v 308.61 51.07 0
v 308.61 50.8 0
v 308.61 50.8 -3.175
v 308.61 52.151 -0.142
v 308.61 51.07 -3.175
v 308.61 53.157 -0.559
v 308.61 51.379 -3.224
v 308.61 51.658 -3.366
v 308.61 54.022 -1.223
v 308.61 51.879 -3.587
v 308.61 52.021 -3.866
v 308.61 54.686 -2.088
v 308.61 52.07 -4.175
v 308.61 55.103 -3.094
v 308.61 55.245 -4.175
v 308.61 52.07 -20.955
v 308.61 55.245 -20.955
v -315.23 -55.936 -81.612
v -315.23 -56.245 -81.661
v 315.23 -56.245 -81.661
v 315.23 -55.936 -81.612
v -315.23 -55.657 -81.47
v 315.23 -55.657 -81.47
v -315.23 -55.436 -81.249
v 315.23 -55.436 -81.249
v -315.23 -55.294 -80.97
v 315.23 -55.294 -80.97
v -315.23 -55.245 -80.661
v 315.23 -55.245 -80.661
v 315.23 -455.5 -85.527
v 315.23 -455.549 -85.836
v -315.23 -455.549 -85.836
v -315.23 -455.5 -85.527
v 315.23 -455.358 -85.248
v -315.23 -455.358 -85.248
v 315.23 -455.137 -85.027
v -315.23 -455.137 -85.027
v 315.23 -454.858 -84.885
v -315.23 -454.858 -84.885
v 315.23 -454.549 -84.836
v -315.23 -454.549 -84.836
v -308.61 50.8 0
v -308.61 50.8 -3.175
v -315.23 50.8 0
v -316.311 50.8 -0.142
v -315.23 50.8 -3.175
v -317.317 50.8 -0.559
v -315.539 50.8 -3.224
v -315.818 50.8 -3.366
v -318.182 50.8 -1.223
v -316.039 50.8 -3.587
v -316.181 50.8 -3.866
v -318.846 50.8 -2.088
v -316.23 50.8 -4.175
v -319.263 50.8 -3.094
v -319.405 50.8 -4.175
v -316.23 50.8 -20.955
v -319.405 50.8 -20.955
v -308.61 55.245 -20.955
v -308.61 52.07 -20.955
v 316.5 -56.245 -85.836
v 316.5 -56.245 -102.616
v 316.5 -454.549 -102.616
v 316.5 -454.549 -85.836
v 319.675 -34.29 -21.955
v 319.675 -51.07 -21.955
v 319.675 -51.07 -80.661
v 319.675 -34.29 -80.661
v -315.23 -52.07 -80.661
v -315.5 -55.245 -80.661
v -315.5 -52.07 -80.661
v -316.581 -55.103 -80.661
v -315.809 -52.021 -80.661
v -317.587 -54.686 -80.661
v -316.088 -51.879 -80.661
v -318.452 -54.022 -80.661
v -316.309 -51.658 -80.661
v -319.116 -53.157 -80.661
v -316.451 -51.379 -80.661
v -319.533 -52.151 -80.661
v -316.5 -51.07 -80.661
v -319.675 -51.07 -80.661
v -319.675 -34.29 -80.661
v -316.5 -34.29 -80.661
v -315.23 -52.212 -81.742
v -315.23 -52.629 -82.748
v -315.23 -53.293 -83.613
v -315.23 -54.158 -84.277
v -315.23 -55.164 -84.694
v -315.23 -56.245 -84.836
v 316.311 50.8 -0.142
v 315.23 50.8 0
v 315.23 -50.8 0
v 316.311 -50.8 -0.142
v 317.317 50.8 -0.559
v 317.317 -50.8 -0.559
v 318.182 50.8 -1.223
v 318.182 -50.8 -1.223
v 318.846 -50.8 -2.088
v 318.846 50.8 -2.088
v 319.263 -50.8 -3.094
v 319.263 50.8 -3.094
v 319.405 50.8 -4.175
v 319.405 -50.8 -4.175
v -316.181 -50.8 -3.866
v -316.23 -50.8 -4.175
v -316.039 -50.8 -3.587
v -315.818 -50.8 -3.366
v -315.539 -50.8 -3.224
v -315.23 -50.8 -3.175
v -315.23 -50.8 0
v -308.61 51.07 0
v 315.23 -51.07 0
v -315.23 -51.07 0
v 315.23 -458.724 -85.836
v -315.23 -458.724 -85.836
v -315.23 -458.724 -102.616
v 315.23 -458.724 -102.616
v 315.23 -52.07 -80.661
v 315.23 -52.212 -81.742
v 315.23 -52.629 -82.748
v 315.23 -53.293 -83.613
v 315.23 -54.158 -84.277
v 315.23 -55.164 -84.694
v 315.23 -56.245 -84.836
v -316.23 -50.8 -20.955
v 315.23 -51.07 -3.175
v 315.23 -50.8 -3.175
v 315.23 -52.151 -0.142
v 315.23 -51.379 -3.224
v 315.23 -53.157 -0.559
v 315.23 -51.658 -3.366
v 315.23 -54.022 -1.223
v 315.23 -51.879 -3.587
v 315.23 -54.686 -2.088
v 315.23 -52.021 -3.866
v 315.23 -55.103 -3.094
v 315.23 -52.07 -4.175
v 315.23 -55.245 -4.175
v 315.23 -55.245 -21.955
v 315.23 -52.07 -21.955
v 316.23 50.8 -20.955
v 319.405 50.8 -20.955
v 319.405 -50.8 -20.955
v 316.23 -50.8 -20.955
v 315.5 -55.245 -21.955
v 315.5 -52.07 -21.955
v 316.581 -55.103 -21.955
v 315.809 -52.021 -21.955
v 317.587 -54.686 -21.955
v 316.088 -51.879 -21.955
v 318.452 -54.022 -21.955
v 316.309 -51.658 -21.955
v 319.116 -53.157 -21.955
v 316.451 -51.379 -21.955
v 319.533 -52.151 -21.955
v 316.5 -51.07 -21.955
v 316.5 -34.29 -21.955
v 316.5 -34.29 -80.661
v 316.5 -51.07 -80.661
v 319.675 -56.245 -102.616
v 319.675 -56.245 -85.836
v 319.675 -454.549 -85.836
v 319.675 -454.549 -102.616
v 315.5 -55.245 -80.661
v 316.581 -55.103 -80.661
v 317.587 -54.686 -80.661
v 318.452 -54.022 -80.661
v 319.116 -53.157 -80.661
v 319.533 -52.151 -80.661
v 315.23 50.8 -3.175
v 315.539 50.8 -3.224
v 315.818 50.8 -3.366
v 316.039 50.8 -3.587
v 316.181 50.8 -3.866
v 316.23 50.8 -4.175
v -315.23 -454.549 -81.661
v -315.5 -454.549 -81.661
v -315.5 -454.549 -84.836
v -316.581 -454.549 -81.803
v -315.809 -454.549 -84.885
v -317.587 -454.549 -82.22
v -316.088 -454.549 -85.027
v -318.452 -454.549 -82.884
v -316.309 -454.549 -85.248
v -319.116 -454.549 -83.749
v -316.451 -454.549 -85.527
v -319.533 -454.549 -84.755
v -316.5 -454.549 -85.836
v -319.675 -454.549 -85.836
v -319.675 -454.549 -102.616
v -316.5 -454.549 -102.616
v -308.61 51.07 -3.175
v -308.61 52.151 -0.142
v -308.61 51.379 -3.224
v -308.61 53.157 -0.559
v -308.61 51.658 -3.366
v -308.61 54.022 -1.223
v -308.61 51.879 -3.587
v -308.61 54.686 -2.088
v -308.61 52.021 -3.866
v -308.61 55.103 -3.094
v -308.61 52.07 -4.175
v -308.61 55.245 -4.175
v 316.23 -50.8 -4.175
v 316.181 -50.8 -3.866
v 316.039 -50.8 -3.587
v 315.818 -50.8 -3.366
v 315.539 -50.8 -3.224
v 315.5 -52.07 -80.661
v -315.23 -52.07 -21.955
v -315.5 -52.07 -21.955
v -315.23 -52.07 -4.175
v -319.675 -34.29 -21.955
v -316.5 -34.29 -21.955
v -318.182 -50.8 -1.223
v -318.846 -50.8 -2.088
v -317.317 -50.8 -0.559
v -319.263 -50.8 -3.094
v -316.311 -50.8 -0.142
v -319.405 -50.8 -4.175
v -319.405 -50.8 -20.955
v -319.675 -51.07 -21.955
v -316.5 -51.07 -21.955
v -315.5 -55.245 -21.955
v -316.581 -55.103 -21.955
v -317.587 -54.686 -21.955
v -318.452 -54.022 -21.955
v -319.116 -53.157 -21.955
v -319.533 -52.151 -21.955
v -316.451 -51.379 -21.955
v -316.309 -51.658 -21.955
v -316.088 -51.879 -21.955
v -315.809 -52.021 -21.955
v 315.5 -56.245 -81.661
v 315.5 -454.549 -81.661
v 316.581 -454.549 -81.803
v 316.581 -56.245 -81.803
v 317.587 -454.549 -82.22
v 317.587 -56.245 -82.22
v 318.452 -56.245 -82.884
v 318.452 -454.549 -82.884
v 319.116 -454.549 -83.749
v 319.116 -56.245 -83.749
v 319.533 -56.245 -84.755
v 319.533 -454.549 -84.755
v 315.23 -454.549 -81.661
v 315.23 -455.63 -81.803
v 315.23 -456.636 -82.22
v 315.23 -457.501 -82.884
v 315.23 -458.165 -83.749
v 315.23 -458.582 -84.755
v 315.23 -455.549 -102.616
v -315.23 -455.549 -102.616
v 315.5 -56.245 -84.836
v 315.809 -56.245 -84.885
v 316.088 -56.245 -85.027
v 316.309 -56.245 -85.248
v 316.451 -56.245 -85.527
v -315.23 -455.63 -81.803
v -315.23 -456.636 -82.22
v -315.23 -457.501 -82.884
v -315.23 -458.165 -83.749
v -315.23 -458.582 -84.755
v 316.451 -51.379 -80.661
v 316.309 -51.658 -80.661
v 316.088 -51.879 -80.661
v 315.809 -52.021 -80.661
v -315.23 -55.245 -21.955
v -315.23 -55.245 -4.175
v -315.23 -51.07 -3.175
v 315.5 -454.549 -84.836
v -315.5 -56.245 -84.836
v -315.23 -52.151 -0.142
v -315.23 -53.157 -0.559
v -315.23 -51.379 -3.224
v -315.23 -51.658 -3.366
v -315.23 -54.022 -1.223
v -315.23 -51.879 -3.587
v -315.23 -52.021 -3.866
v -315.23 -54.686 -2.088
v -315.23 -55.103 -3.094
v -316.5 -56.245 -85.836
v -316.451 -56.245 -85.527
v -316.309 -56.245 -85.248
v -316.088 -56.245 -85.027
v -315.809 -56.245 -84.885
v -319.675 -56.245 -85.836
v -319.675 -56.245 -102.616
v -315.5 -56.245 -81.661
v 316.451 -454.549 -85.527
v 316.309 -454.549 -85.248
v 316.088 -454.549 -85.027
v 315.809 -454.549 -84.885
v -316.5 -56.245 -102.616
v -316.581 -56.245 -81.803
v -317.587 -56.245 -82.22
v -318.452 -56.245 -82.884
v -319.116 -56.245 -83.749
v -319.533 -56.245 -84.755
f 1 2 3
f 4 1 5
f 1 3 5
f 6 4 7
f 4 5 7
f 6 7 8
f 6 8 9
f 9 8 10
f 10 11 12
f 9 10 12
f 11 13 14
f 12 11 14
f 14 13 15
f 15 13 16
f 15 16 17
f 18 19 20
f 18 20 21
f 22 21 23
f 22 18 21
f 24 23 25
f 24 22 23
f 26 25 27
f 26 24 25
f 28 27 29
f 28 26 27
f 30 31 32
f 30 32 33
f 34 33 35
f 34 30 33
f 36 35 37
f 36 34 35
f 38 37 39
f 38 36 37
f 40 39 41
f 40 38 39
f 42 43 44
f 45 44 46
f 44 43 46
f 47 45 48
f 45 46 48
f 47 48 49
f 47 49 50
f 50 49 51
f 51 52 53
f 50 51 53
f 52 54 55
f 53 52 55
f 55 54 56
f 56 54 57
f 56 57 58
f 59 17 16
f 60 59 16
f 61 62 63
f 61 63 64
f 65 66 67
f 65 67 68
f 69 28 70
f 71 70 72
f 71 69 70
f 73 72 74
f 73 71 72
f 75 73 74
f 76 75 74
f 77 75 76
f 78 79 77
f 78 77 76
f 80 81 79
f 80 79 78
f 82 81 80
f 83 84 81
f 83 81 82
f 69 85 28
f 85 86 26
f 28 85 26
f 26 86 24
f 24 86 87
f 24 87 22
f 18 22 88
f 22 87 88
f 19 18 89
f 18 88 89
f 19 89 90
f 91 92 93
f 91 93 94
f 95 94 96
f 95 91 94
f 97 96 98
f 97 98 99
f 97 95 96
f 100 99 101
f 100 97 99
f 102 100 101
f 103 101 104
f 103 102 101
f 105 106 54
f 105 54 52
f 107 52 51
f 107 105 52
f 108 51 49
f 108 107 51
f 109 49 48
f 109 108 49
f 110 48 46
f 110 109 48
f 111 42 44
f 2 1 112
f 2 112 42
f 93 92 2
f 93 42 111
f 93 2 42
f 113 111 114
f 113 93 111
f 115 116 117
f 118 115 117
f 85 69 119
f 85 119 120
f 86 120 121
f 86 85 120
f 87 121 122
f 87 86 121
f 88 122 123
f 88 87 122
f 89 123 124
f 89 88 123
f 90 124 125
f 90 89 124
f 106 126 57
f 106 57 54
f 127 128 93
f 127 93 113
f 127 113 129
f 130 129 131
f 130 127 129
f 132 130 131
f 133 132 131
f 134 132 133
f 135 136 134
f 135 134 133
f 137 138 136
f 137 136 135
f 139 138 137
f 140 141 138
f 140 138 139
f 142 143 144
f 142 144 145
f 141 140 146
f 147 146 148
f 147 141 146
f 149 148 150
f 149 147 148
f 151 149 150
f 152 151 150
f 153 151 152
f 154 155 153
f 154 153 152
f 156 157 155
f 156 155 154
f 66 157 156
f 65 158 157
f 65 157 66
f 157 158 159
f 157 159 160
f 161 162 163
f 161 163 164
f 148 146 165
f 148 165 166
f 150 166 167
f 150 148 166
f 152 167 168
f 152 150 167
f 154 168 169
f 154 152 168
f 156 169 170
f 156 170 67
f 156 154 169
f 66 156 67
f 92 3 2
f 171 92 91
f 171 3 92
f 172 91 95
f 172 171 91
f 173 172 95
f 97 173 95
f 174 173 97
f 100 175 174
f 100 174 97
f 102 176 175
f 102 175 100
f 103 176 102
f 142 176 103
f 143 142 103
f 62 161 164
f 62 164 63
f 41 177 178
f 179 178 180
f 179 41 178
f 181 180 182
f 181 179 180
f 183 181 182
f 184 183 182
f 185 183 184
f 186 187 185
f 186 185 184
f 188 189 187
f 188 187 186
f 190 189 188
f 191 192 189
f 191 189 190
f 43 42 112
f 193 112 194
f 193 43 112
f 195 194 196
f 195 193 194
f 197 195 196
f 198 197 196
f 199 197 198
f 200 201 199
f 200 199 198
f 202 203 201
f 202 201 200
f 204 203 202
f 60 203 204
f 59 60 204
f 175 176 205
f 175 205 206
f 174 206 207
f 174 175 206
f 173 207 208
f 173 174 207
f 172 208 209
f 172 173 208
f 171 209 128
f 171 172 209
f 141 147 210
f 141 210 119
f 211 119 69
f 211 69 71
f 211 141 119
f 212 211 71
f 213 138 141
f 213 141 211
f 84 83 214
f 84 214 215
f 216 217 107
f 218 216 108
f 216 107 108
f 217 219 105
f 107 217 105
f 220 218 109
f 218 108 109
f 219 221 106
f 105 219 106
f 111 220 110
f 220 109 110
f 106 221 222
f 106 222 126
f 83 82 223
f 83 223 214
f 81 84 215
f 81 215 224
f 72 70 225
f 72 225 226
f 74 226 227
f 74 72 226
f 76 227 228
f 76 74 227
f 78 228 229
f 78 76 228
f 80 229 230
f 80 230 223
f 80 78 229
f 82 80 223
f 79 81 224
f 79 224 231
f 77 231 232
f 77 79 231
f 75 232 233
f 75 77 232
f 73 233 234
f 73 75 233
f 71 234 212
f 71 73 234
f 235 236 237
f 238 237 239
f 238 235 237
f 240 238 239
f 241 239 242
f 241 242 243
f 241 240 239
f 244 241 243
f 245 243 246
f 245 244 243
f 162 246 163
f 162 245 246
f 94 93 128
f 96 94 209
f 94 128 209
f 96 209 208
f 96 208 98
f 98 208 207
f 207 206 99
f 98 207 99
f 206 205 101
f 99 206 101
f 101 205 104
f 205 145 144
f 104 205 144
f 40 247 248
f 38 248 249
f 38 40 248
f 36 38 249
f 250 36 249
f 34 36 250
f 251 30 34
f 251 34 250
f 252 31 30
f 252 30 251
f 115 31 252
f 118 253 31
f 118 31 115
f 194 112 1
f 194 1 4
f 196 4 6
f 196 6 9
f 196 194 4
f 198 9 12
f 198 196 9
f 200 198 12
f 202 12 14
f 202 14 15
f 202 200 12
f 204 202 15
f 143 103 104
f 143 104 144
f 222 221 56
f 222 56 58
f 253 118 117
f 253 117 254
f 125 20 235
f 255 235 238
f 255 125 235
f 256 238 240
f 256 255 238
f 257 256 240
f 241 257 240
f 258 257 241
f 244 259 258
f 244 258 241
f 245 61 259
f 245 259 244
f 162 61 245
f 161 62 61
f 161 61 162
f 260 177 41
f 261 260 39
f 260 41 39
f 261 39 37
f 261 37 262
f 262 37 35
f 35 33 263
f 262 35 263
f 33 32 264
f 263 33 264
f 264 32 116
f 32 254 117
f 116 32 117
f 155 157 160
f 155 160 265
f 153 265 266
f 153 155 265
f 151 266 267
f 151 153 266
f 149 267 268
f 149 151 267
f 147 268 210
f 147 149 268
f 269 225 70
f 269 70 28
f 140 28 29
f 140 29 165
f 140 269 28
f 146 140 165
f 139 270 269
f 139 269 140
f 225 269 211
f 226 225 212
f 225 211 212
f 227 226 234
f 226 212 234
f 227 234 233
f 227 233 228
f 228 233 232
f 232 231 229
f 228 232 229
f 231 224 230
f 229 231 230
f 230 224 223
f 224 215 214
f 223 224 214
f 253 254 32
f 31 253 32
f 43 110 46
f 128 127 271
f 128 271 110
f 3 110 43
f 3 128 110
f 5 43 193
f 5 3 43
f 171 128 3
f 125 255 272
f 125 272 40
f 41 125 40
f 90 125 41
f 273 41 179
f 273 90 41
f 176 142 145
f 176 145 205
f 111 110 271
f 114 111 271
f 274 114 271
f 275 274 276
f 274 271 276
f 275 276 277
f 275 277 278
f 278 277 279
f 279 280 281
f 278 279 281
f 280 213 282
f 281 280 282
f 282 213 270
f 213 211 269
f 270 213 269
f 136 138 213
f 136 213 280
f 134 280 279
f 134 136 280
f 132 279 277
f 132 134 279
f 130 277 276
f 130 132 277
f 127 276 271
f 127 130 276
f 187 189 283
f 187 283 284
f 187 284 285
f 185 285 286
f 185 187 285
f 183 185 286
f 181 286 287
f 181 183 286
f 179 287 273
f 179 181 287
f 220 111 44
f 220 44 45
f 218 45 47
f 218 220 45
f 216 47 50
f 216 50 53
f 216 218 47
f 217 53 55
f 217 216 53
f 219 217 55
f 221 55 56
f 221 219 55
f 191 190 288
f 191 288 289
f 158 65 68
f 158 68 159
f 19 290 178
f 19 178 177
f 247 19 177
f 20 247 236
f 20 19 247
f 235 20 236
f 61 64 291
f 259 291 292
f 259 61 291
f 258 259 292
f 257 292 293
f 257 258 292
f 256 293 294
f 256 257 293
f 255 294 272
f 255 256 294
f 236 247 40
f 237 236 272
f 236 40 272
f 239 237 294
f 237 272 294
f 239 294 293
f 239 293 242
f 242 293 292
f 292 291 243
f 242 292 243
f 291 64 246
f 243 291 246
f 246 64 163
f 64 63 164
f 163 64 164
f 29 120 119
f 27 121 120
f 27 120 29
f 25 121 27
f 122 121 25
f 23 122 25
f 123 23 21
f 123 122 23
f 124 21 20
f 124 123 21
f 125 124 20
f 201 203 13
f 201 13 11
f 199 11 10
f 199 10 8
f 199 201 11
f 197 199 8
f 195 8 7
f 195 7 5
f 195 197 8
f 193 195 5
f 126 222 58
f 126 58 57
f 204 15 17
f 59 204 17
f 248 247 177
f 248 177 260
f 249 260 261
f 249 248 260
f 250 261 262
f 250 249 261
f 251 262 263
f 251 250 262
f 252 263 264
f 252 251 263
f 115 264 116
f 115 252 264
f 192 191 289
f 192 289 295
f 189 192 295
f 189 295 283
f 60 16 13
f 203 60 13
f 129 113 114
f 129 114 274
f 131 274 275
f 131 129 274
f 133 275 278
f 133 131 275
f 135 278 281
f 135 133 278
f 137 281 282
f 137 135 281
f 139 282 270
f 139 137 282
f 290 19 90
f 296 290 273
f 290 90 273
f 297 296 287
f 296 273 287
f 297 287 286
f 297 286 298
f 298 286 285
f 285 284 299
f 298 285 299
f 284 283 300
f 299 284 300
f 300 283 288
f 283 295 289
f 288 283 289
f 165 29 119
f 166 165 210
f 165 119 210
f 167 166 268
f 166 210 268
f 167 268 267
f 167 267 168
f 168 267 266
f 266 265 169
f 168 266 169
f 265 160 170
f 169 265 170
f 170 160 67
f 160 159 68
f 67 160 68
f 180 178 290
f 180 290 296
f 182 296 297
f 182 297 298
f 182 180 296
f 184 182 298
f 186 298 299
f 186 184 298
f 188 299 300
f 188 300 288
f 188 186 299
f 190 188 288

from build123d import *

# Parameters (mm, degrees)
SKETCH1_W                 = 629.92
SKETCH1_H                 = 101.6
BASE_FLANGE1_DEPTH        = 3.175
EDGE_FLANGE1_DEPTH        = 617.22
EDGE_FLANGE2_DEPTH        = 101.6
EDGE_FLANGE2_BEND_DEPTH   = 101.6
EDGE_FLANGE3_DEPTH        = 630.46
EDGE_FLANGE4_DEPTH        = 630.46
EDGE_FLANGE5_DEPTH        = 630.46
EDGE_FLANGE6_DEPTH        = 58.706
EDGE_FLANGE6_BEND_DEPTH   = 58.706
EDGE_FLANGE6_BEND_2_DEPTH = 398.304
EDGE_FLANGE6_BEND_3_DEPTH = 398.304


# Sheet-metal steps are written as plain solids
with BuildPart() as part:
    # Sketch1 → Base-Flange1 (new body)
    with BuildSketch(Plane.XY):
        Rectangle(SKETCH1_W, SKETCH1_H)
    extrude(amount=-BASE_FLANGE1_DEPTH)

    # Edge-Flange1 section (across the edge) → Edge-Flange1 (add)
    with BuildSketch(Plane(origin=(-308.61, 52.07, -3.175), x_dir=(0, -1, 0), z_dir=(1, 0, 0))):
        with BuildLine():
            Line((-3.175, 1), (-3.175, 17.78))
            Line((-3.175, 17.78), (0, 17.78))
            Line((0, 17.78), (0, 1))
            ThreePointArc((0, 1), (0.292893219, 0.292893219), (1, 0))
            Line((1, 0), (1.27, 0))
            Line((1.27, 0), (1.27, -3.175))
            Line((1.27, -3.175), (1, -3.175))
            ThreePointArc((1, -3.175), (-1.952170811, -1.952170811), (-3.175, 1))
        make_face()
    extrude(amount=EDGE_FLANGE1_DEPTH)

    # Edge-Flange2 section (across the edge) → Edge-Flange2 (add)
    with BuildSketch(Plane(origin=(-316.23, -50.8, -3.175), x_dir=(1, 0, 0), z_dir=(0, 1, 0))):
        with BuildLine():
            Line((-3.175, 1), (-3.175, 17.78))
            Line((-3.175, 17.78), (0, 17.78))
            Line((0, 17.78), (0, 1))
            ThreePointArc((0, 1), (0.292893219, 0.292893219), (1, 0))
            Line((1, 0), (1.27, 0))
            Line((1.27, 0), (1.27, -3.175))
            Line((1.27, -3.175), (1, -3.175))
            ThreePointArc((1, -3.175), (-1.952170811, -1.952170811), (-3.175, 1))
        make_face()
    extrude(amount=EDGE_FLANGE2_DEPTH)

    # Edge-Flange2 section 2 (across the edge) → Edge-Flange2 bend (add)
    with BuildSketch(Plane(origin=(316.23, 50.8, -3.175), x_dir=(-1, 0, 0), z_dir=(0, -1, 0))):
        with BuildLine():
            Line((-3.175, 1), (-3.175, 17.78))
            Line((-3.175, 17.78), (0, 17.78))
            Line((0, 17.78), (0, 1))
            ThreePointArc((0, 1), (0.292893219, 0.292893219), (1, 0))
            Line((1, 0), (1.27, 0))
            Line((1.27, 0), (1.27, -3.175))
            Line((1.27, -3.175), (1, -3.175))
            ThreePointArc((1, -3.175), (-1.952170811, -1.952170811), (-3.175, 1))
        make_face()
    extrude(amount=EDGE_FLANGE2_BEND_DEPTH)

    # Edge-Flange3 section (across the edge) → Edge-Flange3 (add)
    with BuildSketch(Plane(origin=(315.23, -52.07, -3.175), x_dir=(0, 1, 0), z_dir=(-1, 0, 0))):
        with BuildLine():
            Line((-3.175, 1), (-3.175, 77.216))
            Line((-3.175, 77.216), (0, 77.216))
            Line((0, 77.216), (0, 1))
            ThreePointArc((0, 1), (0.292893219, 0.292893219), (1, 0))
            Line((1, 0), (1.27, 0))
            Line((1.27, 0), (1.27, -3.175))
            Line((1.27, -3.175), (1, -3.175))
            ThreePointArc((1, -3.175), (-1.952170811, -1.952170811), (-3.175, 1))
        make_face()
    extrude(amount=EDGE_FLANGE3_DEPTH)

    # Edge-Flange4 section (across the edge) → Edge-Flange4 (add)
    with BuildSketch(Plane(origin=(-315.23, -55.245, -81.661), x_dir=(0, 0, 1), z_dir=(1, 0, 0))):
        with BuildLine():
            Line((-3.175, 1), (-3.175, 399.034))
            Line((-3.175, 399.034), (0, 399.034))
            Line((0, 399.034), (0, 1))
            ThreePointArc((0, 1), (0.292893219, 0.292893219), (1, 0))
            Line((1, 0), (1.27, 0))
            Line((1.27, 0), (1.27, -3.175))
            Line((1.27, -3.175), (1, -3.175))
            ThreePointArc((1, -3.175), (-1.952170811, -1.952170811), (-3.175, 1))
        make_face()
    extrude(amount=EDGE_FLANGE4_DEPTH)

    # Edge-Flange5 section (across the edge) → Edge-Flange5 (add)
    with BuildSketch(Plane(origin=(315.23, -455.549, -84.836), x_dir=(0, 1, 0), z_dir=(-1, 0, 0))):
        with BuildLine():
            Line((-3.175, 1), (-3.175, 17.78))
            Line((-3.175, 17.78), (0, 17.78))
            Line((0, 17.78), (0, 1))
            ThreePointArc((0, 1), (0.292893219, 0.292893219), (1, 0))
            Line((1, 0), (1.27, 0))
            Line((1.27, 0), (1.27, -3.175))
            Line((1.27, -3.175), (1, -3.175))
            ThreePointArc((1, -3.175), (-1.952170811, -1.952170811), (-3.175, 1))
        make_face()
    extrude(amount=EDGE_FLANGE5_DEPTH)

    # Edge-Flange6 section (across the edge) → Edge-Flange6 (add)
    with BuildSketch(Plane(origin=(-316.5, -52.07, -80.661), x_dir=(1, 0, 0), z_dir=(0, 0, 1))):
        with BuildLine():
            Line((-3.175, 1), (-3.175, 17.78))
            Line((-3.175, 17.78), (0, 17.78))
            Line((0, 17.78), (0, 1))
            ThreePointArc((0, 1), (0.292893219, 0.292893219), (1, 0))
            Line((1, 0), (1.27, 0))
            Line((1.27, 0), (1.27, -3.175))
            Line((1.27, -3.175), (1, -3.175))
            ThreePointArc((1, -3.175), (-1.952170811, -1.952170811), (-3.175, 1))
        make_face()
    extrude(amount=EDGE_FLANGE6_DEPTH)

    # Edge-Flange6 section 2 (across the edge) → Edge-Flange6 bend (add)
    with BuildSketch(Plane(origin=(316.5, -52.07, -21.955), x_dir=(-1, 0, 0), z_dir=(0, 0, -1))):
        with BuildLine():
            Line((-3.175, 1), (-3.175, 17.78))
            Line((-3.175, 17.78), (0, 17.78))
            Line((0, 17.78), (0, 1))
            ThreePointArc((0, 1), (0.292893219, 0.292893219), (1, 0))
            Line((1, 0), (1.27, 0))
            Line((1.27, 0), (1.27, -3.175))
            Line((1.27, -3.175), (1, -3.175))
            ThreePointArc((1, -3.175), (-1.952170811, -1.952170811), (-3.175, 1))
        make_face()
    extrude(amount=EDGE_FLANGE6_BEND_DEPTH)

    # Edge-Flange6 section 3 (across the edge) → Edge-Flange6 bend 2 (add)
    with BuildSketch(Plane(origin=(-316.5, -454.549, -84.836), x_dir=(1, 0, 0), z_dir=(0, 1, 0))):
        with BuildLine():
            Line((-3.175, 1), (-3.175, 17.78))
            Line((-3.175, 17.78), (0, 17.78))
            Line((0, 17.78), (0, 1))
            ThreePointArc((0, 1), (0.292893219, 0.292893219), (1, 0))
            Line((1, 0), (1.27, 0))
            Line((1.27, 0), (1.27, -3.175))
            Line((1.27, -3.175), (1, -3.175))
            ThreePointArc((1, -3.175), (-1.952170811, -1.952170811), (-3.175, 1))
        make_face()
    extrude(amount=EDGE_FLANGE6_BEND_2_DEPTH)

    # Edge-Flange6 section 4 (across the edge) → Edge-Flange6 bend 3 (add)
    with BuildSketch(Plane(origin=(316.5, -56.245, -84.836), x_dir=(-1, 0, 0), z_dir=(0, -1, 0))):
        with BuildLine():
            Line((-3.175, 1), (-3.175, 17.78))
            Line((-3.175, 17.78), (0, 17.78))
            Line((0, 17.78), (0, 1))
            ThreePointArc((0, 1), (0.292893219, 0.292893219), (1, 0))
            Line((1, 0), (1.27, 0))
            Line((1.27, 0), (1.27, -3.175))
            Line((1.27, -3.175), (1, -3.175))
            ThreePointArc((1, -3.175), (-1.952170811, -1.952170811), (-3.175, 1))
        make_face()
    extrude(amount=EDGE_FLANGE6_BEND_3_DEPTH)


solid = part.part
